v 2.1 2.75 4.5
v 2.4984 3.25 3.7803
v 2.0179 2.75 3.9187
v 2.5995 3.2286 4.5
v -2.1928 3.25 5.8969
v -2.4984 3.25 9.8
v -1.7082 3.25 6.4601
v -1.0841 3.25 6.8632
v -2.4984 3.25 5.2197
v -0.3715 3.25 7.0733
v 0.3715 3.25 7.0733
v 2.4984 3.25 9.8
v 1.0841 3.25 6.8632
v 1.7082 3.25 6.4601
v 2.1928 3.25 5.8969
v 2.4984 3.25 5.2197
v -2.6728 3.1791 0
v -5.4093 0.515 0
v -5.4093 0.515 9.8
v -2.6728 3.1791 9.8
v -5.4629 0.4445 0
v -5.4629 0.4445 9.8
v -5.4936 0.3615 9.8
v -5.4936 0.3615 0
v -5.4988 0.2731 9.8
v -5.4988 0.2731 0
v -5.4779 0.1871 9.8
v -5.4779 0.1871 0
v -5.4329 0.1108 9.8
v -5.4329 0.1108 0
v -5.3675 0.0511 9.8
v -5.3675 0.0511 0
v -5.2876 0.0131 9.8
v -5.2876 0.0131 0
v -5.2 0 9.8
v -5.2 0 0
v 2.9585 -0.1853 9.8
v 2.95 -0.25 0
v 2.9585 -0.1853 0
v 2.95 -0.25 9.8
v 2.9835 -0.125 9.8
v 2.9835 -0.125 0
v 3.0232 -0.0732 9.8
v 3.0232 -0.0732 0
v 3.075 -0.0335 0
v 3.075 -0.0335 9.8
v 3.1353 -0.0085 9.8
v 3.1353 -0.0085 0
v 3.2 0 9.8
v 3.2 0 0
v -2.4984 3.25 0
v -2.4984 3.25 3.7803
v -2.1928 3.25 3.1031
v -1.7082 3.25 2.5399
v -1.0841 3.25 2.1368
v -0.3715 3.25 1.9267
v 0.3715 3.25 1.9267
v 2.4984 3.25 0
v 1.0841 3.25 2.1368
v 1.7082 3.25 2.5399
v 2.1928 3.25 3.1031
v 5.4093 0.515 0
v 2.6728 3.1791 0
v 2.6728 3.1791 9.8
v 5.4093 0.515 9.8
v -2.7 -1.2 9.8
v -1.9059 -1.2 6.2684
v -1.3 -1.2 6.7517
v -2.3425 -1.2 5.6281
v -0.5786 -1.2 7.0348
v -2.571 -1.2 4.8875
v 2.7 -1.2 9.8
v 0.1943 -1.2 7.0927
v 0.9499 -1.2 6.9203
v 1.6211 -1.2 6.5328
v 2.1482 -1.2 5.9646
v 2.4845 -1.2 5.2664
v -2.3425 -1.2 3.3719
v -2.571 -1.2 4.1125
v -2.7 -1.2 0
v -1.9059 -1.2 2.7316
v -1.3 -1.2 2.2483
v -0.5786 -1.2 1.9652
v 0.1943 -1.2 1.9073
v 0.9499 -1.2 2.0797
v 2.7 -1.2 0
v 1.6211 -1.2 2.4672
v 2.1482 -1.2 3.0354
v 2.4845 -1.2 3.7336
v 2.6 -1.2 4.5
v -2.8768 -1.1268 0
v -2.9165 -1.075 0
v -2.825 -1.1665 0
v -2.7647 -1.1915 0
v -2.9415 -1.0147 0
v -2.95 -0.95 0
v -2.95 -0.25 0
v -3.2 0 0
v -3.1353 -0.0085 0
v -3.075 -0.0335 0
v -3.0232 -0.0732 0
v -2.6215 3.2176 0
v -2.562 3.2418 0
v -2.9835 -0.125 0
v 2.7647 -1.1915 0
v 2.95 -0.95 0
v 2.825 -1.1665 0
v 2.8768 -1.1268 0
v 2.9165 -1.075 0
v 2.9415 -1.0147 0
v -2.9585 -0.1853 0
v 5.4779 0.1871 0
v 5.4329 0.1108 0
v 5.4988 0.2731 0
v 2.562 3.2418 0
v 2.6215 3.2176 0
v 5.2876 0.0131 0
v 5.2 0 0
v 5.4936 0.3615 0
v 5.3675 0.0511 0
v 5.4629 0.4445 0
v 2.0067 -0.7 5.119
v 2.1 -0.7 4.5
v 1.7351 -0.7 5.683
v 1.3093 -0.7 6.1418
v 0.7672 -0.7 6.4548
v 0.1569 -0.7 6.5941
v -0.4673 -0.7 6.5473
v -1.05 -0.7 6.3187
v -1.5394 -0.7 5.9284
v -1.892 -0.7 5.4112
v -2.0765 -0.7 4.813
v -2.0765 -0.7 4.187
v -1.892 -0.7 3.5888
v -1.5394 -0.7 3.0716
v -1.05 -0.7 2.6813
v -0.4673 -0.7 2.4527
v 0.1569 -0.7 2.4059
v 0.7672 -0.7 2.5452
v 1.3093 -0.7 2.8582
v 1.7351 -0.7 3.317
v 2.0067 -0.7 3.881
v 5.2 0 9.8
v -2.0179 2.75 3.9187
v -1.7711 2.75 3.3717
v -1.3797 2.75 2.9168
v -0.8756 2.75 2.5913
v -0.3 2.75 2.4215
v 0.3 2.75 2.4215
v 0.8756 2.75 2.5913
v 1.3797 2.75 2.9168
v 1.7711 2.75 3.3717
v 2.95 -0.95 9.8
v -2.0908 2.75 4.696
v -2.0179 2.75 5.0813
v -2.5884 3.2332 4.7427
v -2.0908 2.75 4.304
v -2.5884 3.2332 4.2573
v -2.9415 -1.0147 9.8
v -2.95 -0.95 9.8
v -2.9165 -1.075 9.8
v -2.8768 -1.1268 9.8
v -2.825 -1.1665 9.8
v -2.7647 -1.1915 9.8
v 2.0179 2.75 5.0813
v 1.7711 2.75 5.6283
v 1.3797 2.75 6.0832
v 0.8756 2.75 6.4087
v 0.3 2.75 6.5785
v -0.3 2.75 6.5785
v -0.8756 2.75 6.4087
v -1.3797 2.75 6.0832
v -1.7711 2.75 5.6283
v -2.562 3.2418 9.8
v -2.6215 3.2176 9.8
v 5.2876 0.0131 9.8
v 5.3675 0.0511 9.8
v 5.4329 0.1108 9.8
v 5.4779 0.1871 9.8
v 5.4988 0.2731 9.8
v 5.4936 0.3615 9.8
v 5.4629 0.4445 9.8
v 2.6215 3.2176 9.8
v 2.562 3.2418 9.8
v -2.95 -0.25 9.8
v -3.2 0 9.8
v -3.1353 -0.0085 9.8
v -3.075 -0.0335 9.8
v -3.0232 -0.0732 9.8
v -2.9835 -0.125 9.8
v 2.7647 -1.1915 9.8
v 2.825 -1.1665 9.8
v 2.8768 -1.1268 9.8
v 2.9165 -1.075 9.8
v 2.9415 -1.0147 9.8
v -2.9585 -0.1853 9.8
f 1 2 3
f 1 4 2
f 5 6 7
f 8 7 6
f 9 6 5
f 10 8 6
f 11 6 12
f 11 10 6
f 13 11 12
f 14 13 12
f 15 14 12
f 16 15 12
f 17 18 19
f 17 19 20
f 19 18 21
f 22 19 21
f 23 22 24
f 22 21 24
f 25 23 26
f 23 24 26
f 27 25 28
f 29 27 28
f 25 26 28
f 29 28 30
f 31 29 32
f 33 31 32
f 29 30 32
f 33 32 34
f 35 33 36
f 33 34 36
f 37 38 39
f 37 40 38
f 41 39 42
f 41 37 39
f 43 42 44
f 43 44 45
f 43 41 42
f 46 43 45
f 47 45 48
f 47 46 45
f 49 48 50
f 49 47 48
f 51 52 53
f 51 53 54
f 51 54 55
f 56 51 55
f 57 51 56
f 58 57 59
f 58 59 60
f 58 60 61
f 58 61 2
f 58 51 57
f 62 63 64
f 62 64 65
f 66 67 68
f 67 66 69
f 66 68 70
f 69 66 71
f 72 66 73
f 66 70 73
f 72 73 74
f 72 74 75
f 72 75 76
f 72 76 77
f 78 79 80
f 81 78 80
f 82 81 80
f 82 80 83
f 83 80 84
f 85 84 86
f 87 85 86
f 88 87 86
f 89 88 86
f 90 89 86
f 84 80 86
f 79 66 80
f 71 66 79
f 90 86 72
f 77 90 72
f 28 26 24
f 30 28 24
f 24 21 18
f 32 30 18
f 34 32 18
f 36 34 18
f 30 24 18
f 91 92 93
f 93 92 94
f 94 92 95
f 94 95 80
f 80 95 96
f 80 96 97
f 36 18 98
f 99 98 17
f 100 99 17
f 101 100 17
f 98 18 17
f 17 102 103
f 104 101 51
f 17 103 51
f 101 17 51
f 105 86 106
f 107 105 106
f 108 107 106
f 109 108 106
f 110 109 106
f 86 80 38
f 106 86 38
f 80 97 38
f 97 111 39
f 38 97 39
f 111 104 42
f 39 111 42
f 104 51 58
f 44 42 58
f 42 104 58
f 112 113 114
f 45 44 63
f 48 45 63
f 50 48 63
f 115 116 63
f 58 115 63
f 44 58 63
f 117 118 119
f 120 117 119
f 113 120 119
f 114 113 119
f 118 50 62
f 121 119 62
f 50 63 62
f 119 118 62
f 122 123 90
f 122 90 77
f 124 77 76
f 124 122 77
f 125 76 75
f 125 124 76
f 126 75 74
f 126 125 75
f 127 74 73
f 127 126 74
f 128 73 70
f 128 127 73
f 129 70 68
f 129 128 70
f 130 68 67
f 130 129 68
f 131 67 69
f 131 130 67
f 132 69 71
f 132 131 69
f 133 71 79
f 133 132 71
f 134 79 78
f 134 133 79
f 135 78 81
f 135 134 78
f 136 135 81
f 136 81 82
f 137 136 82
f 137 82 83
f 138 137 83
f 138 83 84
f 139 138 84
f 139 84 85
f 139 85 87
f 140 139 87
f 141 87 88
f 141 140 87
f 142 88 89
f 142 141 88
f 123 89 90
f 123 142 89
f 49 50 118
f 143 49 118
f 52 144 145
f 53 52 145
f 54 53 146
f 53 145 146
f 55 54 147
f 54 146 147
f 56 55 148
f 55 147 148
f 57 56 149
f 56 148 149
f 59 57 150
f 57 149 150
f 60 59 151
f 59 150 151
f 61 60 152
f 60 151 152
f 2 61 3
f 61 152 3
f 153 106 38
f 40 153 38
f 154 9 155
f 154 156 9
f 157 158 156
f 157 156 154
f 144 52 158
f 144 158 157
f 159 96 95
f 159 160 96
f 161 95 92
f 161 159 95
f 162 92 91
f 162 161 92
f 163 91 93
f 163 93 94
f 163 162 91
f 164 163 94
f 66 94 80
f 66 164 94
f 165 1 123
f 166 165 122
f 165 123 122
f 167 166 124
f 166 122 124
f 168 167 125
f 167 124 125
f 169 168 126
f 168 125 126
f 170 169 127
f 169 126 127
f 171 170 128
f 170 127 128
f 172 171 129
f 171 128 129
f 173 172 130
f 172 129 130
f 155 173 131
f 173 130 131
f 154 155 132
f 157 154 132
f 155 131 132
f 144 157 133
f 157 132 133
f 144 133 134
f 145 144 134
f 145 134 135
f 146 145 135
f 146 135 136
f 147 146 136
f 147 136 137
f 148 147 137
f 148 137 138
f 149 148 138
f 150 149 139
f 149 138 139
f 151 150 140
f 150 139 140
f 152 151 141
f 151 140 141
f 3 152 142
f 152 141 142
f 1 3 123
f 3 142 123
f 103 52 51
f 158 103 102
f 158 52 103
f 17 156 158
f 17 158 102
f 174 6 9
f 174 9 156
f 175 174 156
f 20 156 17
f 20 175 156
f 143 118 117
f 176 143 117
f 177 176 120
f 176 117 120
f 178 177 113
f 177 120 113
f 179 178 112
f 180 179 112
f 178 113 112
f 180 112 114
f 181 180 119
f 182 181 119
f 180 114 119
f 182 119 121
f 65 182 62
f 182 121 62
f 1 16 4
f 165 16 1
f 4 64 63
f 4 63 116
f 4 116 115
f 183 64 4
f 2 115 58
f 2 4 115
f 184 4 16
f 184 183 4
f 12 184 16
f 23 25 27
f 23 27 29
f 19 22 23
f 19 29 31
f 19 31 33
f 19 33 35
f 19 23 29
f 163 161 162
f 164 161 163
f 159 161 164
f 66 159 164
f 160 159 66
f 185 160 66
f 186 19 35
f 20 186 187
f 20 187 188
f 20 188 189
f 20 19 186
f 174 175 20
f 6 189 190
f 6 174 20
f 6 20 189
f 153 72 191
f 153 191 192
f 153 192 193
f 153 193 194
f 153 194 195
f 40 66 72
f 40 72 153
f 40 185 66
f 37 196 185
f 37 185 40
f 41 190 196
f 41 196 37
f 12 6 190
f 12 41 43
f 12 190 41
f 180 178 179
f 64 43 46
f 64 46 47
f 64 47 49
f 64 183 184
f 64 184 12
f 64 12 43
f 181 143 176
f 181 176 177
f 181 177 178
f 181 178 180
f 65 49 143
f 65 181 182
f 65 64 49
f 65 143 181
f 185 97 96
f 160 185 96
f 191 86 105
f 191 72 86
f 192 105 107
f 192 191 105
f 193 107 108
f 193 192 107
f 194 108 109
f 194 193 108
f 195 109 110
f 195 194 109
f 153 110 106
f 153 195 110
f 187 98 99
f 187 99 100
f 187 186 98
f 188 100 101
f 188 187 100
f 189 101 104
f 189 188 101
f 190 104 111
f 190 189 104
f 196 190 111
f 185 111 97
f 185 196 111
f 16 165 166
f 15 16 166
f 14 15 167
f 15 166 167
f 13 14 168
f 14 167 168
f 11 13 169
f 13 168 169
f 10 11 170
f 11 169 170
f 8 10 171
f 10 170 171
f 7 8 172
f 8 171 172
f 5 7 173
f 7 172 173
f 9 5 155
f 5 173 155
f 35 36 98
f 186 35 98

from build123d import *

# Parameters (mm, degrees)
PAD_DEPTH    = 9.8
FILLET_R     = 0.25
SKETCH001_R  = 2.1
POCKET_DEPTH = 4.451
CHAMFER_SIZE = 0.5


with BuildPart() as part:
    # Sketch → Pad (new body)
    with BuildSketch(Plane.XY):
        with BuildLine():
            Line((-5.2, 0), (-2.95, 0))
            Line((-2.95, 0), (-2.95, -1.2))
            Line((-2.95, -1.2), (2.95, -1.2))
            Line((2.95, -1.2), (2.95, 0))
            Line((2.95, 0), (5.2, 0))
            ThreePointArc((5.2, 0), (5.477926, 0.187053), (5.409273, 0.514953))
            Line((2.6, 3.25), (5.409273, 0.514953))
            Line((-2.6, 3.25), (2.6, 3.25))
            Line((-5.409273, 0.514953), (-2.6, 3.25))
            ThreePointArc((-5.409273, 0.514953), (-5.477926, 0.187053), (-5.2, 0))
        make_face()
    extrude(amount=PAD_DEPTH)

    # Fillet
    fillet_edges = [part.edges().sort_by_distance(p)[0] for p in [
        (2.95, 0, 4.9),
        (2.95, -1.2, 4.9),
        (-2.95, -1.2, 4.9),
        (-2.95, 0, 4.9),
        (-2.6, 3.25, 4.9),
        (2.6, 3.25, 4.9),
    ]]
    fillet(fillet_edges, radius=FILLET_R)

    # Sketch001 (on Face10 of Fillet) → Pocket (cut, through all)
    with BuildSketch(Plane.XZ.offset(1.2)):
        with Locations((0, 4.5)):
            Circle(SKETCH001_R)
    extrude(amount=-POCKET_DEPTH, mode=Mode.SUBTRACT)

    # Chamfer
    chamfer_edges = [part.edges().sort_by_distance(p)[0] for p in [
        (-2.1, -1.2, 4.5),
        (2.1, 1.025, 4.5),
        (-2.1, 3.25, 4.5),
    ]]
    chamfer(chamfer_edges, length=CHAMFER_SIZE)


solid = part.part
